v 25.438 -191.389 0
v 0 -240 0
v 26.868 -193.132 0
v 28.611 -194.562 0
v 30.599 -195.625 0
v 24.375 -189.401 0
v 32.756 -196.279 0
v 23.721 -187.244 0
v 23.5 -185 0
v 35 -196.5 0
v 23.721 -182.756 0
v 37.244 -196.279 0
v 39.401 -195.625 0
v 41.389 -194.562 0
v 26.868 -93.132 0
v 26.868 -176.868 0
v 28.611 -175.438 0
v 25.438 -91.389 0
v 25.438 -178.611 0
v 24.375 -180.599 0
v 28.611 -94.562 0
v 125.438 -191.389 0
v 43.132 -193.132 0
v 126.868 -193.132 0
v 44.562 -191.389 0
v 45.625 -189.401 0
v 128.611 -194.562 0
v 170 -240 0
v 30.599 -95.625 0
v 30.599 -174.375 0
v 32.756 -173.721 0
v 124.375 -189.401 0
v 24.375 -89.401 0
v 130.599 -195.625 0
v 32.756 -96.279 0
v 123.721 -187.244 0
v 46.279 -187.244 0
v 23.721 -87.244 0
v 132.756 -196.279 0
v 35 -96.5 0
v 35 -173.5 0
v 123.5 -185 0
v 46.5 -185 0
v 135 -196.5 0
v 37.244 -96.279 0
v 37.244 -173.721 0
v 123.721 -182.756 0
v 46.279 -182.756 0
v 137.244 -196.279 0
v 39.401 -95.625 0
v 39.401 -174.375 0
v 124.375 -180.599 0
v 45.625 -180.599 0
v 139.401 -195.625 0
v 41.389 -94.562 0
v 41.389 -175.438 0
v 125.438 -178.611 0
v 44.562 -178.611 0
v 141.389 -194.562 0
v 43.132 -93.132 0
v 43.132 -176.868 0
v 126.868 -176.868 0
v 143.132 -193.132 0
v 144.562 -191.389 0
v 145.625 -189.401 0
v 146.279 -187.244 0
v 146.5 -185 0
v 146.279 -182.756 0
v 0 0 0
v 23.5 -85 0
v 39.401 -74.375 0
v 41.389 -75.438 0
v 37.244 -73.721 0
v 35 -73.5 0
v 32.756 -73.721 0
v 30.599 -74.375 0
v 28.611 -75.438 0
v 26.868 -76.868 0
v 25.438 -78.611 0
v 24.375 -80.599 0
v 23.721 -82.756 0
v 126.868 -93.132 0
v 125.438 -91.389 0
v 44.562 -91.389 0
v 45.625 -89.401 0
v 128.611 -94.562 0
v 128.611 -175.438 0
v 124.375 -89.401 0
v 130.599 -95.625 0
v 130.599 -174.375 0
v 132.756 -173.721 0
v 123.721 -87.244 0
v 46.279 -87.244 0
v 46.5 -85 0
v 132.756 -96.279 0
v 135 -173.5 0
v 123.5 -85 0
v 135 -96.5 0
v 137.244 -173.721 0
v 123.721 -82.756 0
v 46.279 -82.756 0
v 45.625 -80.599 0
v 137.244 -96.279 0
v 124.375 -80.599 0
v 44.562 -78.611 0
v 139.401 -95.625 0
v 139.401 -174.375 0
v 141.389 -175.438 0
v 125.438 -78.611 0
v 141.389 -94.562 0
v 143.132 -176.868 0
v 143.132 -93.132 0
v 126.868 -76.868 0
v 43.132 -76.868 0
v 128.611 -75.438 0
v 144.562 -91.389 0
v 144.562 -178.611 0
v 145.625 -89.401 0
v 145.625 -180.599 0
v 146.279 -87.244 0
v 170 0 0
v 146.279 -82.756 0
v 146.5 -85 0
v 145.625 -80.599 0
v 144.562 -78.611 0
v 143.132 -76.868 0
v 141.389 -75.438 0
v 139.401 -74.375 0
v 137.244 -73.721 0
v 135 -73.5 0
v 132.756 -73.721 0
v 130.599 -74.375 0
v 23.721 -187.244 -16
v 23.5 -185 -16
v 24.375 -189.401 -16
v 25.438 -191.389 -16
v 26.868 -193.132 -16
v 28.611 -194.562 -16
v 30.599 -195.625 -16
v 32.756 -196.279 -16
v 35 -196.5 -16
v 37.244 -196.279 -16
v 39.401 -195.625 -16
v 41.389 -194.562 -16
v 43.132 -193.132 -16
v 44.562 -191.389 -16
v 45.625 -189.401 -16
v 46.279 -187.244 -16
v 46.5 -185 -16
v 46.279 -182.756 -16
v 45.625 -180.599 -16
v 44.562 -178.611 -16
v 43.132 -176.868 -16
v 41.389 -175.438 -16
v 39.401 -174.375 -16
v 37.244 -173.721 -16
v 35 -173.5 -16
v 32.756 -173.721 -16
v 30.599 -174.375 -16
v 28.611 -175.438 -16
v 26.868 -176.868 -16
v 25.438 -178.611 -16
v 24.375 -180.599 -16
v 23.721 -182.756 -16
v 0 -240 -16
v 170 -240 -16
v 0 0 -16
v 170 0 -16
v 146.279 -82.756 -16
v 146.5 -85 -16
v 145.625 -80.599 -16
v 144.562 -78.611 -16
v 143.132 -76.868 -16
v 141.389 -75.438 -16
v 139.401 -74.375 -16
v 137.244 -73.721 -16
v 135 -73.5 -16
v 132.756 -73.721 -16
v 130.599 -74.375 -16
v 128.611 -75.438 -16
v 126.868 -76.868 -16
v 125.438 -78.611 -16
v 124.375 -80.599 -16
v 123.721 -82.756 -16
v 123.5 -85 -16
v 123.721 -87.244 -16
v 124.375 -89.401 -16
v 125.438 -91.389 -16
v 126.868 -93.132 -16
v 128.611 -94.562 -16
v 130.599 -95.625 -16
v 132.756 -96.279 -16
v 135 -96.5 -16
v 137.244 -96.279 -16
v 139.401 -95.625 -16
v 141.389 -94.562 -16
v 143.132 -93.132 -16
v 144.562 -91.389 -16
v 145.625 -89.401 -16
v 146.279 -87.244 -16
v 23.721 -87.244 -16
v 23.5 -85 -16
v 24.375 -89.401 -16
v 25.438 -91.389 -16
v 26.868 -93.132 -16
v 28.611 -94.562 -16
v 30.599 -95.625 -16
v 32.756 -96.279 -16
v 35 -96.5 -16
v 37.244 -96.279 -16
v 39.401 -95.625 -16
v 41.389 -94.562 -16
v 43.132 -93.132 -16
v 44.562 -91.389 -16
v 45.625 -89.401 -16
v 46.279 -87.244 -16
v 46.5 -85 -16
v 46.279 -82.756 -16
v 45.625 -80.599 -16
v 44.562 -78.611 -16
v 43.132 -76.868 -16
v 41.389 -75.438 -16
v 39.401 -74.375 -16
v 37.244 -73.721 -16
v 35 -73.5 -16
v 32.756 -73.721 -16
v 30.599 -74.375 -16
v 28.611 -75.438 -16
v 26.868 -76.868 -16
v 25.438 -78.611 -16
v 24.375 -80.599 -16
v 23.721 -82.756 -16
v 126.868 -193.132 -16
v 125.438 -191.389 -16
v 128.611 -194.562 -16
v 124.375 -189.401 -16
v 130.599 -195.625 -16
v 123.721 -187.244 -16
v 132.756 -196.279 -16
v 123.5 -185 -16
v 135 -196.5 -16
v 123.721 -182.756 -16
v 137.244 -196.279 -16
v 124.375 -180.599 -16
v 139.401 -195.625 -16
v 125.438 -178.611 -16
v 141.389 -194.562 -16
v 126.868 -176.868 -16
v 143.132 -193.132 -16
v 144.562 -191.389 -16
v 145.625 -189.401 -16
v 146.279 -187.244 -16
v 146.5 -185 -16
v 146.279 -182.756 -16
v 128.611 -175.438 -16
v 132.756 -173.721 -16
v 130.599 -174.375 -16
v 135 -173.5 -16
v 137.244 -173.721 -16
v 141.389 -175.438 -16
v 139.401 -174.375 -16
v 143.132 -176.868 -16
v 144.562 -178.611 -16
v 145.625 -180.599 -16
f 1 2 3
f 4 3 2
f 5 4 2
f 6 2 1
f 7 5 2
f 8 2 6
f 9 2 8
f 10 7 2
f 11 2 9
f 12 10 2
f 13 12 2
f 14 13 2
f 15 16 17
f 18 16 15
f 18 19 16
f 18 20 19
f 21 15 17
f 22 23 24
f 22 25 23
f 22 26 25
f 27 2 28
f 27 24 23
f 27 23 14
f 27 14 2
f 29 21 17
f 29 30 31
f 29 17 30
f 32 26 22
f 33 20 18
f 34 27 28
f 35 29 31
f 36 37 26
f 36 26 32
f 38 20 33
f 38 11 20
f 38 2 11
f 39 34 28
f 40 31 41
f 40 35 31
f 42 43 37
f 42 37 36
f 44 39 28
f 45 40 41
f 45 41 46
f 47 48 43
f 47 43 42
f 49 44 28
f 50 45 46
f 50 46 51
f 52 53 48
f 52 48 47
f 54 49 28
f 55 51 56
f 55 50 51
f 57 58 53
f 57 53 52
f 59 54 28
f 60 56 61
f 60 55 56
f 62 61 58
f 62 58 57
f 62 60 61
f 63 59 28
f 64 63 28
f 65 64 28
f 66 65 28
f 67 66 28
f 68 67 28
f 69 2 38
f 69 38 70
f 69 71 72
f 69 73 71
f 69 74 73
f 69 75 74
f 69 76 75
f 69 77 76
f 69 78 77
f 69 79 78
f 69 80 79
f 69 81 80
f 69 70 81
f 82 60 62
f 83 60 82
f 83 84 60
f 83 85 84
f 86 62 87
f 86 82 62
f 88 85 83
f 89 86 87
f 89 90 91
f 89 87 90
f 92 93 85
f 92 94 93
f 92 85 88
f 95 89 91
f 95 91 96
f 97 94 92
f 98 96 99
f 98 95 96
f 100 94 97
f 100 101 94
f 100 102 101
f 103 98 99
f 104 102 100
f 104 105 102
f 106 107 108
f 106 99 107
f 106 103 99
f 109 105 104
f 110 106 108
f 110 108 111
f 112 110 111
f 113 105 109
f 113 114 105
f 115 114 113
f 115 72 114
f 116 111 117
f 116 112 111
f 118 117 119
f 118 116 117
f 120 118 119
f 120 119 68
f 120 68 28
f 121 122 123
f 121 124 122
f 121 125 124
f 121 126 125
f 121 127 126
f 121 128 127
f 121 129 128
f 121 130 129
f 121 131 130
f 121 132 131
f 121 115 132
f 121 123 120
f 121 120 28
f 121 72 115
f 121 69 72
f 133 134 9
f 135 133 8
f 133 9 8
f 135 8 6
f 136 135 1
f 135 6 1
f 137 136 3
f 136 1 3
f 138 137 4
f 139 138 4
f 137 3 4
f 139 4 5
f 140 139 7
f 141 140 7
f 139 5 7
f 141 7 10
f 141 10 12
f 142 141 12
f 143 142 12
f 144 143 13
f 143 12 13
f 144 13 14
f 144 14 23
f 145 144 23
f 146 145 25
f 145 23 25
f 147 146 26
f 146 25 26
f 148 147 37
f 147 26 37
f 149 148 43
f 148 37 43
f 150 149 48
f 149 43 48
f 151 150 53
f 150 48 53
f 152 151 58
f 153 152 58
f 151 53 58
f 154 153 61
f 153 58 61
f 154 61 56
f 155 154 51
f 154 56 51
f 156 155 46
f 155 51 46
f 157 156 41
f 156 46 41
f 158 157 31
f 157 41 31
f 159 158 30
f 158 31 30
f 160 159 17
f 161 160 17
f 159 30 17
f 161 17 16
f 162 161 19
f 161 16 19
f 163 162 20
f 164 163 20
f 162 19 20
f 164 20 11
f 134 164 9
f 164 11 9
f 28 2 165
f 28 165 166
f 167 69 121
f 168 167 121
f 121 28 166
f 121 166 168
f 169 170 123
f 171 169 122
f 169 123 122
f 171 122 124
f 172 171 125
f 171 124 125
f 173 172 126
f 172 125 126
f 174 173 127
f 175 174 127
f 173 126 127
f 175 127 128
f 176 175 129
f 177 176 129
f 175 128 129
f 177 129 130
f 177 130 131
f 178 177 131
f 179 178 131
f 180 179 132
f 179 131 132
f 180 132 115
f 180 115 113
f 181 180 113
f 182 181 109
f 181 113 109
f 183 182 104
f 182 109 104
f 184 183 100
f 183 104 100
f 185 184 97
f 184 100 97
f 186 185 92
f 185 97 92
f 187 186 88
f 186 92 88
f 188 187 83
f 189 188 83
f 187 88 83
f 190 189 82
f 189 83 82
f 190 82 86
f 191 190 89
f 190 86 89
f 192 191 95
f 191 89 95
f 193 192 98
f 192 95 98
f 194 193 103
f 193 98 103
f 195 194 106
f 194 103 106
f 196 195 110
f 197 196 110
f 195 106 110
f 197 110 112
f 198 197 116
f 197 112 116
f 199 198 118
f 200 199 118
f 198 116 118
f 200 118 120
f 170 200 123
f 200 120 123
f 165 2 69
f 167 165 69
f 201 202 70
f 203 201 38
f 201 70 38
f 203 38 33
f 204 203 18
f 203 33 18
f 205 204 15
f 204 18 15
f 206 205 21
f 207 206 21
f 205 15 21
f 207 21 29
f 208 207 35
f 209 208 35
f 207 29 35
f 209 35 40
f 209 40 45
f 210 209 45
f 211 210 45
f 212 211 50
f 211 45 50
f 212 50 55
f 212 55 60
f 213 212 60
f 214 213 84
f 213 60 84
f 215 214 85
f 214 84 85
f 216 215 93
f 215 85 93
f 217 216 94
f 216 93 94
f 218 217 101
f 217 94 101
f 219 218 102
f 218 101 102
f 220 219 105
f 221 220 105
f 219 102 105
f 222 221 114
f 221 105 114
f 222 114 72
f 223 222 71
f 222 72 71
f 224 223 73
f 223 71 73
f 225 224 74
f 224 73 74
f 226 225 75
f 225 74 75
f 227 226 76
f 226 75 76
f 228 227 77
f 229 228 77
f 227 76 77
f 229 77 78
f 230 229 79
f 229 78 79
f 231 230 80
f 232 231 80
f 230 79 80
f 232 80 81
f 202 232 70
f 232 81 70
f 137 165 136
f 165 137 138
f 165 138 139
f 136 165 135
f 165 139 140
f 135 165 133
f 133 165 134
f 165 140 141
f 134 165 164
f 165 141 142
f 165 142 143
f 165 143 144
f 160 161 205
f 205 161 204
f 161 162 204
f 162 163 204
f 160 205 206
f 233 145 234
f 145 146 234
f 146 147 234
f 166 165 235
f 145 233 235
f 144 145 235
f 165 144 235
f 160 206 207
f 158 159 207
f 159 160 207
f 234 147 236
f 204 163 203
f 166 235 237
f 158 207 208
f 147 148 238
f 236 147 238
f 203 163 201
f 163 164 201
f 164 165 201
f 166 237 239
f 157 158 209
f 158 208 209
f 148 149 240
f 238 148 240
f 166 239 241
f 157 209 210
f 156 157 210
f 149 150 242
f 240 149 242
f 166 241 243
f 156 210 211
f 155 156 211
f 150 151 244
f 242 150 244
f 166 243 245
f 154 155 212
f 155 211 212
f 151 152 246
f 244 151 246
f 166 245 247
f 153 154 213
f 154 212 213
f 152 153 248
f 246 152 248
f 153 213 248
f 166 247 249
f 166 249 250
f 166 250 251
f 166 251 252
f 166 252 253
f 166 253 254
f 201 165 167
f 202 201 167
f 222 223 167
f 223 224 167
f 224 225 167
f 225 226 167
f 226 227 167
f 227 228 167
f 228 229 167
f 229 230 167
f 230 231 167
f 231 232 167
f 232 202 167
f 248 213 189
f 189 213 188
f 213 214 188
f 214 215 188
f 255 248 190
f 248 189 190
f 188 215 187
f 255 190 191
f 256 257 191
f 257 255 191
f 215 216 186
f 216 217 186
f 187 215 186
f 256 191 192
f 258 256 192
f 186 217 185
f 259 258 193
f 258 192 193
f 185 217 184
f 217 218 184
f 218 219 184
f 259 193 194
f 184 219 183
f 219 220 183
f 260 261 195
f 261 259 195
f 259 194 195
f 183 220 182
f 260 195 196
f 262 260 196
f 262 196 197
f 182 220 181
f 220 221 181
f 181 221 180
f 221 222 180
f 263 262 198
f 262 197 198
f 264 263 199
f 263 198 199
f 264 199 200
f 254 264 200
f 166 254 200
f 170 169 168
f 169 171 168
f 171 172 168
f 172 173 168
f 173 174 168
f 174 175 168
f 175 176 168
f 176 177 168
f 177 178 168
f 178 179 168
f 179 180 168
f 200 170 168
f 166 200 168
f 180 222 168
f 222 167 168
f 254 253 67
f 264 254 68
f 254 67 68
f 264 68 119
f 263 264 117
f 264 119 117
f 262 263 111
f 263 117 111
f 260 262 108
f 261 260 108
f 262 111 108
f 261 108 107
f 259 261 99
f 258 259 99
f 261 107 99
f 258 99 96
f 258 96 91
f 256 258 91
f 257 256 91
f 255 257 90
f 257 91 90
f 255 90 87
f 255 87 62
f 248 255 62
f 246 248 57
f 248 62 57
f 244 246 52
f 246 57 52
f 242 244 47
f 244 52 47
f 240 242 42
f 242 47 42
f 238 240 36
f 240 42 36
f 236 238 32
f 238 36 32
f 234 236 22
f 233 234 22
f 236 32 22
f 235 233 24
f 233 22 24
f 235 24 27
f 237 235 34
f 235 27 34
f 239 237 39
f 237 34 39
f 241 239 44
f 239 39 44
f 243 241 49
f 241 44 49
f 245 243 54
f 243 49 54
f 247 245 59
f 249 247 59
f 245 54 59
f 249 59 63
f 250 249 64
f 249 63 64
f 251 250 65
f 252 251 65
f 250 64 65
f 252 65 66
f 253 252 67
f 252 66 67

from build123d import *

# Parameters (mm, degrees)
SKETCH_1_W             = 170
SKETCH_1_H             = 240
SKETCH_1_R             = 11.5
SM_BASE_FLANGE_1_DEPTH = 16


# Sheet-metal steps are written as plain solids
with BuildPart() as part:
    # Sketch 1 → Базовая кромка1 (new body)
    with BuildSketch(Plane.XY):
        with Locations((85, -120)):
            Rectangle(SKETCH_1_W, SKETCH_1_H)
        with Locations((135, -185)):
            Circle(SKETCH_1_R, mode=Mode.SUBTRACT)
        with Locations((135, -85)):
            Circle(SKETCH_1_R, mode=Mode.SUBTRACT)
        with Locations(Location((35, -85, 0), (0, 0, 180))):
            Circle(SKETCH_1_R, mode=Mode.SUBTRACT)
        with Locations(Location((35, -185, 0), (0, 0, 180))):
            Circle(SKETCH_1_R, mode=Mode.SUBTRACT)
    extrude(amount=-SM_BASE_FLANGE_1_DEPTH)


solid = part.part
